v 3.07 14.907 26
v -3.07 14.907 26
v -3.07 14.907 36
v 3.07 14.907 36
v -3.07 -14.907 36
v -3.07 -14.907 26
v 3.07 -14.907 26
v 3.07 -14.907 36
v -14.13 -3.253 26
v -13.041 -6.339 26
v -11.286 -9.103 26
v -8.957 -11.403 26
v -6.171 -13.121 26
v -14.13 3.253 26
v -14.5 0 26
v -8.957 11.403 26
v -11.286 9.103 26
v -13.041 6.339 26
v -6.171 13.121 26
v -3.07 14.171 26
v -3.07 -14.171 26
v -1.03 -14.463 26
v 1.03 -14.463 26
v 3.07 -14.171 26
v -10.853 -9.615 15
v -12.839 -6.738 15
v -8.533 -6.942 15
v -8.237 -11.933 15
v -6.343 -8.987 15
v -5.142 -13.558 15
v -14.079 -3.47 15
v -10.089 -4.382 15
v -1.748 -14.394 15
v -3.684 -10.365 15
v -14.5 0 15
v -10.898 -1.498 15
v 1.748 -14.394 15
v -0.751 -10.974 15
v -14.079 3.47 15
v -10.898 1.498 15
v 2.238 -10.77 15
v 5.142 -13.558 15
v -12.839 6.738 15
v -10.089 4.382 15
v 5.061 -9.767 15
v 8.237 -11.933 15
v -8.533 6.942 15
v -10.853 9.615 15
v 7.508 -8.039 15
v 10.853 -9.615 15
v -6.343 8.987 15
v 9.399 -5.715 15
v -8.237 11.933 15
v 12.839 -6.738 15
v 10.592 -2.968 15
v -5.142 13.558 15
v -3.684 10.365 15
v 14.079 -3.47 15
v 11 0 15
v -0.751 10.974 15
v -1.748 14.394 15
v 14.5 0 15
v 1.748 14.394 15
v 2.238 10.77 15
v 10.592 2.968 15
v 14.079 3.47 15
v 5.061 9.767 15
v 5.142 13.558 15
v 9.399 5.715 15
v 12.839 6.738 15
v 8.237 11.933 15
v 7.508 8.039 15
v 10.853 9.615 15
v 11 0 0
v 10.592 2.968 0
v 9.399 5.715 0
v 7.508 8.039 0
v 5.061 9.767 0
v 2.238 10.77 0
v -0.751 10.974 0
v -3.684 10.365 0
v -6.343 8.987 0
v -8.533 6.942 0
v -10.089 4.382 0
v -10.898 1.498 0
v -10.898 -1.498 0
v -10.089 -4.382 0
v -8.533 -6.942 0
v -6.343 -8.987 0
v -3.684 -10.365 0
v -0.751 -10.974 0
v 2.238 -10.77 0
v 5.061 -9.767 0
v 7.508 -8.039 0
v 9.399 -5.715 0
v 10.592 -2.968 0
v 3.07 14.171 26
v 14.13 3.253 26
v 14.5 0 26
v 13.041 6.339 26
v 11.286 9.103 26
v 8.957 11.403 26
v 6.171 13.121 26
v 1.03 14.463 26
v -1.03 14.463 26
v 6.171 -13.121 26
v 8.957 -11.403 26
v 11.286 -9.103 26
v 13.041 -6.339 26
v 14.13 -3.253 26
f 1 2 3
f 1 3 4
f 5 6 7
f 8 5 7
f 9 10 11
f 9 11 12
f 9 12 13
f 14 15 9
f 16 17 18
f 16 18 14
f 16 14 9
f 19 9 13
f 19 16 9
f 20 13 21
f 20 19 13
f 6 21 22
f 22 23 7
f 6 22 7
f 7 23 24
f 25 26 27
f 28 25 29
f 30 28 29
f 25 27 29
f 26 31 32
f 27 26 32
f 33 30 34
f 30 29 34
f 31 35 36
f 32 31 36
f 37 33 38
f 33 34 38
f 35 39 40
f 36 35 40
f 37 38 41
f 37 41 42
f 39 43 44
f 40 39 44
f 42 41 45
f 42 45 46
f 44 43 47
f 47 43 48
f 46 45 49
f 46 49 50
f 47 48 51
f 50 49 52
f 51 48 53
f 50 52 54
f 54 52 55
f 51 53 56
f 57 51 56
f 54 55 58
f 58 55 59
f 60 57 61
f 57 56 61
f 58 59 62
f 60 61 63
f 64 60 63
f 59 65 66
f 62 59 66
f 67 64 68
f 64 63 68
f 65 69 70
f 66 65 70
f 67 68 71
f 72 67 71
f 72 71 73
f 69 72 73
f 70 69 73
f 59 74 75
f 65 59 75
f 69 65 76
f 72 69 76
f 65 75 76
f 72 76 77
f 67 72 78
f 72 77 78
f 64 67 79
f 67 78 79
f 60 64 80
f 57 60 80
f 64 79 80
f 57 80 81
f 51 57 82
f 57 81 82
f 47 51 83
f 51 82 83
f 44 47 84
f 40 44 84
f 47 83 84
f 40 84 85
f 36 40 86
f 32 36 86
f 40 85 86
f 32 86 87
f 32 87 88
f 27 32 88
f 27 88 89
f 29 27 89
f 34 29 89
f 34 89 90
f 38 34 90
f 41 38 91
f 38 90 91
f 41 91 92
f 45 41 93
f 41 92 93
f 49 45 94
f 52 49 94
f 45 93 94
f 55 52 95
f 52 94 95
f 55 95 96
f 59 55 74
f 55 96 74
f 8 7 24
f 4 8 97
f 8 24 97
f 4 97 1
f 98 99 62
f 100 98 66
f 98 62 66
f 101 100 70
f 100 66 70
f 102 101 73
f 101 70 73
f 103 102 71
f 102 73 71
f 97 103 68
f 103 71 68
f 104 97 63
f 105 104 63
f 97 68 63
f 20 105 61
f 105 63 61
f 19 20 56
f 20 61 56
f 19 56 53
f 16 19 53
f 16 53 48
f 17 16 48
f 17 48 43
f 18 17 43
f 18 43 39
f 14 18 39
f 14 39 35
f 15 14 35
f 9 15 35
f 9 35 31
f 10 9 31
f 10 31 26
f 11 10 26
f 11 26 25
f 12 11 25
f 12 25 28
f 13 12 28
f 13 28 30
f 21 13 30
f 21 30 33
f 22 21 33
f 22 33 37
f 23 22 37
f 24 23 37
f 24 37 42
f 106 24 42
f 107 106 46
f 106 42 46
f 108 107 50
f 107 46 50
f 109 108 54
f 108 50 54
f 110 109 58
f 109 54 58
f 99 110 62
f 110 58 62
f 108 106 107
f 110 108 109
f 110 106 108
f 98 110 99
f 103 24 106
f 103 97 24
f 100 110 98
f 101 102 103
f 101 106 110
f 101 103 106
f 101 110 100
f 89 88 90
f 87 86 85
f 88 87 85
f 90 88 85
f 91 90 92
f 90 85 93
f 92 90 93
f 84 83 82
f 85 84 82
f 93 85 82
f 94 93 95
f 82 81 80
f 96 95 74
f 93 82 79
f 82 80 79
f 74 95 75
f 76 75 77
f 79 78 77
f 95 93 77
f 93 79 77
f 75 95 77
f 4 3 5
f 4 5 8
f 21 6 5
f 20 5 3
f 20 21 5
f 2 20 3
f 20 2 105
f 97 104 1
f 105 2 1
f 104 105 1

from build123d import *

# Parameters (mm, degrees)
SKETCH_1_R      = 11
EXTRUDE_1_DEPTH = 15
SKETCH_2_R      = 14.5
EXTRUDE_2_DEPTH = 11
SKETCH_3_W      = 6.140328376
SKETCH_3_H      = 29.814639278
EXTRUDE_3_DEPTH = 10


with BuildPart() as part:
    # 草图1 → 凸台-拉伸1 (new body)
    with BuildSketch(Plane.XY):
        Circle(SKETCH_1_R)
    extrude(amount=EXTRUDE_1_DEPTH)

    # 草图2 → 凸台-拉伸2 (add)
    with BuildSketch(Plane.XY.offset(15)):
        Circle(SKETCH_2_R)
    extrude(amount=EXTRUDE_2_DEPTH)

    # 草图3 → 凸台-拉伸3 (add)
    with BuildSketch(Plane.XY.offset(26)):
        Rectangle(SKETCH_3_W, SKETCH_3_H)
    extrude(amount=EXTRUDE_3_DEPTH)


solid = part.part
